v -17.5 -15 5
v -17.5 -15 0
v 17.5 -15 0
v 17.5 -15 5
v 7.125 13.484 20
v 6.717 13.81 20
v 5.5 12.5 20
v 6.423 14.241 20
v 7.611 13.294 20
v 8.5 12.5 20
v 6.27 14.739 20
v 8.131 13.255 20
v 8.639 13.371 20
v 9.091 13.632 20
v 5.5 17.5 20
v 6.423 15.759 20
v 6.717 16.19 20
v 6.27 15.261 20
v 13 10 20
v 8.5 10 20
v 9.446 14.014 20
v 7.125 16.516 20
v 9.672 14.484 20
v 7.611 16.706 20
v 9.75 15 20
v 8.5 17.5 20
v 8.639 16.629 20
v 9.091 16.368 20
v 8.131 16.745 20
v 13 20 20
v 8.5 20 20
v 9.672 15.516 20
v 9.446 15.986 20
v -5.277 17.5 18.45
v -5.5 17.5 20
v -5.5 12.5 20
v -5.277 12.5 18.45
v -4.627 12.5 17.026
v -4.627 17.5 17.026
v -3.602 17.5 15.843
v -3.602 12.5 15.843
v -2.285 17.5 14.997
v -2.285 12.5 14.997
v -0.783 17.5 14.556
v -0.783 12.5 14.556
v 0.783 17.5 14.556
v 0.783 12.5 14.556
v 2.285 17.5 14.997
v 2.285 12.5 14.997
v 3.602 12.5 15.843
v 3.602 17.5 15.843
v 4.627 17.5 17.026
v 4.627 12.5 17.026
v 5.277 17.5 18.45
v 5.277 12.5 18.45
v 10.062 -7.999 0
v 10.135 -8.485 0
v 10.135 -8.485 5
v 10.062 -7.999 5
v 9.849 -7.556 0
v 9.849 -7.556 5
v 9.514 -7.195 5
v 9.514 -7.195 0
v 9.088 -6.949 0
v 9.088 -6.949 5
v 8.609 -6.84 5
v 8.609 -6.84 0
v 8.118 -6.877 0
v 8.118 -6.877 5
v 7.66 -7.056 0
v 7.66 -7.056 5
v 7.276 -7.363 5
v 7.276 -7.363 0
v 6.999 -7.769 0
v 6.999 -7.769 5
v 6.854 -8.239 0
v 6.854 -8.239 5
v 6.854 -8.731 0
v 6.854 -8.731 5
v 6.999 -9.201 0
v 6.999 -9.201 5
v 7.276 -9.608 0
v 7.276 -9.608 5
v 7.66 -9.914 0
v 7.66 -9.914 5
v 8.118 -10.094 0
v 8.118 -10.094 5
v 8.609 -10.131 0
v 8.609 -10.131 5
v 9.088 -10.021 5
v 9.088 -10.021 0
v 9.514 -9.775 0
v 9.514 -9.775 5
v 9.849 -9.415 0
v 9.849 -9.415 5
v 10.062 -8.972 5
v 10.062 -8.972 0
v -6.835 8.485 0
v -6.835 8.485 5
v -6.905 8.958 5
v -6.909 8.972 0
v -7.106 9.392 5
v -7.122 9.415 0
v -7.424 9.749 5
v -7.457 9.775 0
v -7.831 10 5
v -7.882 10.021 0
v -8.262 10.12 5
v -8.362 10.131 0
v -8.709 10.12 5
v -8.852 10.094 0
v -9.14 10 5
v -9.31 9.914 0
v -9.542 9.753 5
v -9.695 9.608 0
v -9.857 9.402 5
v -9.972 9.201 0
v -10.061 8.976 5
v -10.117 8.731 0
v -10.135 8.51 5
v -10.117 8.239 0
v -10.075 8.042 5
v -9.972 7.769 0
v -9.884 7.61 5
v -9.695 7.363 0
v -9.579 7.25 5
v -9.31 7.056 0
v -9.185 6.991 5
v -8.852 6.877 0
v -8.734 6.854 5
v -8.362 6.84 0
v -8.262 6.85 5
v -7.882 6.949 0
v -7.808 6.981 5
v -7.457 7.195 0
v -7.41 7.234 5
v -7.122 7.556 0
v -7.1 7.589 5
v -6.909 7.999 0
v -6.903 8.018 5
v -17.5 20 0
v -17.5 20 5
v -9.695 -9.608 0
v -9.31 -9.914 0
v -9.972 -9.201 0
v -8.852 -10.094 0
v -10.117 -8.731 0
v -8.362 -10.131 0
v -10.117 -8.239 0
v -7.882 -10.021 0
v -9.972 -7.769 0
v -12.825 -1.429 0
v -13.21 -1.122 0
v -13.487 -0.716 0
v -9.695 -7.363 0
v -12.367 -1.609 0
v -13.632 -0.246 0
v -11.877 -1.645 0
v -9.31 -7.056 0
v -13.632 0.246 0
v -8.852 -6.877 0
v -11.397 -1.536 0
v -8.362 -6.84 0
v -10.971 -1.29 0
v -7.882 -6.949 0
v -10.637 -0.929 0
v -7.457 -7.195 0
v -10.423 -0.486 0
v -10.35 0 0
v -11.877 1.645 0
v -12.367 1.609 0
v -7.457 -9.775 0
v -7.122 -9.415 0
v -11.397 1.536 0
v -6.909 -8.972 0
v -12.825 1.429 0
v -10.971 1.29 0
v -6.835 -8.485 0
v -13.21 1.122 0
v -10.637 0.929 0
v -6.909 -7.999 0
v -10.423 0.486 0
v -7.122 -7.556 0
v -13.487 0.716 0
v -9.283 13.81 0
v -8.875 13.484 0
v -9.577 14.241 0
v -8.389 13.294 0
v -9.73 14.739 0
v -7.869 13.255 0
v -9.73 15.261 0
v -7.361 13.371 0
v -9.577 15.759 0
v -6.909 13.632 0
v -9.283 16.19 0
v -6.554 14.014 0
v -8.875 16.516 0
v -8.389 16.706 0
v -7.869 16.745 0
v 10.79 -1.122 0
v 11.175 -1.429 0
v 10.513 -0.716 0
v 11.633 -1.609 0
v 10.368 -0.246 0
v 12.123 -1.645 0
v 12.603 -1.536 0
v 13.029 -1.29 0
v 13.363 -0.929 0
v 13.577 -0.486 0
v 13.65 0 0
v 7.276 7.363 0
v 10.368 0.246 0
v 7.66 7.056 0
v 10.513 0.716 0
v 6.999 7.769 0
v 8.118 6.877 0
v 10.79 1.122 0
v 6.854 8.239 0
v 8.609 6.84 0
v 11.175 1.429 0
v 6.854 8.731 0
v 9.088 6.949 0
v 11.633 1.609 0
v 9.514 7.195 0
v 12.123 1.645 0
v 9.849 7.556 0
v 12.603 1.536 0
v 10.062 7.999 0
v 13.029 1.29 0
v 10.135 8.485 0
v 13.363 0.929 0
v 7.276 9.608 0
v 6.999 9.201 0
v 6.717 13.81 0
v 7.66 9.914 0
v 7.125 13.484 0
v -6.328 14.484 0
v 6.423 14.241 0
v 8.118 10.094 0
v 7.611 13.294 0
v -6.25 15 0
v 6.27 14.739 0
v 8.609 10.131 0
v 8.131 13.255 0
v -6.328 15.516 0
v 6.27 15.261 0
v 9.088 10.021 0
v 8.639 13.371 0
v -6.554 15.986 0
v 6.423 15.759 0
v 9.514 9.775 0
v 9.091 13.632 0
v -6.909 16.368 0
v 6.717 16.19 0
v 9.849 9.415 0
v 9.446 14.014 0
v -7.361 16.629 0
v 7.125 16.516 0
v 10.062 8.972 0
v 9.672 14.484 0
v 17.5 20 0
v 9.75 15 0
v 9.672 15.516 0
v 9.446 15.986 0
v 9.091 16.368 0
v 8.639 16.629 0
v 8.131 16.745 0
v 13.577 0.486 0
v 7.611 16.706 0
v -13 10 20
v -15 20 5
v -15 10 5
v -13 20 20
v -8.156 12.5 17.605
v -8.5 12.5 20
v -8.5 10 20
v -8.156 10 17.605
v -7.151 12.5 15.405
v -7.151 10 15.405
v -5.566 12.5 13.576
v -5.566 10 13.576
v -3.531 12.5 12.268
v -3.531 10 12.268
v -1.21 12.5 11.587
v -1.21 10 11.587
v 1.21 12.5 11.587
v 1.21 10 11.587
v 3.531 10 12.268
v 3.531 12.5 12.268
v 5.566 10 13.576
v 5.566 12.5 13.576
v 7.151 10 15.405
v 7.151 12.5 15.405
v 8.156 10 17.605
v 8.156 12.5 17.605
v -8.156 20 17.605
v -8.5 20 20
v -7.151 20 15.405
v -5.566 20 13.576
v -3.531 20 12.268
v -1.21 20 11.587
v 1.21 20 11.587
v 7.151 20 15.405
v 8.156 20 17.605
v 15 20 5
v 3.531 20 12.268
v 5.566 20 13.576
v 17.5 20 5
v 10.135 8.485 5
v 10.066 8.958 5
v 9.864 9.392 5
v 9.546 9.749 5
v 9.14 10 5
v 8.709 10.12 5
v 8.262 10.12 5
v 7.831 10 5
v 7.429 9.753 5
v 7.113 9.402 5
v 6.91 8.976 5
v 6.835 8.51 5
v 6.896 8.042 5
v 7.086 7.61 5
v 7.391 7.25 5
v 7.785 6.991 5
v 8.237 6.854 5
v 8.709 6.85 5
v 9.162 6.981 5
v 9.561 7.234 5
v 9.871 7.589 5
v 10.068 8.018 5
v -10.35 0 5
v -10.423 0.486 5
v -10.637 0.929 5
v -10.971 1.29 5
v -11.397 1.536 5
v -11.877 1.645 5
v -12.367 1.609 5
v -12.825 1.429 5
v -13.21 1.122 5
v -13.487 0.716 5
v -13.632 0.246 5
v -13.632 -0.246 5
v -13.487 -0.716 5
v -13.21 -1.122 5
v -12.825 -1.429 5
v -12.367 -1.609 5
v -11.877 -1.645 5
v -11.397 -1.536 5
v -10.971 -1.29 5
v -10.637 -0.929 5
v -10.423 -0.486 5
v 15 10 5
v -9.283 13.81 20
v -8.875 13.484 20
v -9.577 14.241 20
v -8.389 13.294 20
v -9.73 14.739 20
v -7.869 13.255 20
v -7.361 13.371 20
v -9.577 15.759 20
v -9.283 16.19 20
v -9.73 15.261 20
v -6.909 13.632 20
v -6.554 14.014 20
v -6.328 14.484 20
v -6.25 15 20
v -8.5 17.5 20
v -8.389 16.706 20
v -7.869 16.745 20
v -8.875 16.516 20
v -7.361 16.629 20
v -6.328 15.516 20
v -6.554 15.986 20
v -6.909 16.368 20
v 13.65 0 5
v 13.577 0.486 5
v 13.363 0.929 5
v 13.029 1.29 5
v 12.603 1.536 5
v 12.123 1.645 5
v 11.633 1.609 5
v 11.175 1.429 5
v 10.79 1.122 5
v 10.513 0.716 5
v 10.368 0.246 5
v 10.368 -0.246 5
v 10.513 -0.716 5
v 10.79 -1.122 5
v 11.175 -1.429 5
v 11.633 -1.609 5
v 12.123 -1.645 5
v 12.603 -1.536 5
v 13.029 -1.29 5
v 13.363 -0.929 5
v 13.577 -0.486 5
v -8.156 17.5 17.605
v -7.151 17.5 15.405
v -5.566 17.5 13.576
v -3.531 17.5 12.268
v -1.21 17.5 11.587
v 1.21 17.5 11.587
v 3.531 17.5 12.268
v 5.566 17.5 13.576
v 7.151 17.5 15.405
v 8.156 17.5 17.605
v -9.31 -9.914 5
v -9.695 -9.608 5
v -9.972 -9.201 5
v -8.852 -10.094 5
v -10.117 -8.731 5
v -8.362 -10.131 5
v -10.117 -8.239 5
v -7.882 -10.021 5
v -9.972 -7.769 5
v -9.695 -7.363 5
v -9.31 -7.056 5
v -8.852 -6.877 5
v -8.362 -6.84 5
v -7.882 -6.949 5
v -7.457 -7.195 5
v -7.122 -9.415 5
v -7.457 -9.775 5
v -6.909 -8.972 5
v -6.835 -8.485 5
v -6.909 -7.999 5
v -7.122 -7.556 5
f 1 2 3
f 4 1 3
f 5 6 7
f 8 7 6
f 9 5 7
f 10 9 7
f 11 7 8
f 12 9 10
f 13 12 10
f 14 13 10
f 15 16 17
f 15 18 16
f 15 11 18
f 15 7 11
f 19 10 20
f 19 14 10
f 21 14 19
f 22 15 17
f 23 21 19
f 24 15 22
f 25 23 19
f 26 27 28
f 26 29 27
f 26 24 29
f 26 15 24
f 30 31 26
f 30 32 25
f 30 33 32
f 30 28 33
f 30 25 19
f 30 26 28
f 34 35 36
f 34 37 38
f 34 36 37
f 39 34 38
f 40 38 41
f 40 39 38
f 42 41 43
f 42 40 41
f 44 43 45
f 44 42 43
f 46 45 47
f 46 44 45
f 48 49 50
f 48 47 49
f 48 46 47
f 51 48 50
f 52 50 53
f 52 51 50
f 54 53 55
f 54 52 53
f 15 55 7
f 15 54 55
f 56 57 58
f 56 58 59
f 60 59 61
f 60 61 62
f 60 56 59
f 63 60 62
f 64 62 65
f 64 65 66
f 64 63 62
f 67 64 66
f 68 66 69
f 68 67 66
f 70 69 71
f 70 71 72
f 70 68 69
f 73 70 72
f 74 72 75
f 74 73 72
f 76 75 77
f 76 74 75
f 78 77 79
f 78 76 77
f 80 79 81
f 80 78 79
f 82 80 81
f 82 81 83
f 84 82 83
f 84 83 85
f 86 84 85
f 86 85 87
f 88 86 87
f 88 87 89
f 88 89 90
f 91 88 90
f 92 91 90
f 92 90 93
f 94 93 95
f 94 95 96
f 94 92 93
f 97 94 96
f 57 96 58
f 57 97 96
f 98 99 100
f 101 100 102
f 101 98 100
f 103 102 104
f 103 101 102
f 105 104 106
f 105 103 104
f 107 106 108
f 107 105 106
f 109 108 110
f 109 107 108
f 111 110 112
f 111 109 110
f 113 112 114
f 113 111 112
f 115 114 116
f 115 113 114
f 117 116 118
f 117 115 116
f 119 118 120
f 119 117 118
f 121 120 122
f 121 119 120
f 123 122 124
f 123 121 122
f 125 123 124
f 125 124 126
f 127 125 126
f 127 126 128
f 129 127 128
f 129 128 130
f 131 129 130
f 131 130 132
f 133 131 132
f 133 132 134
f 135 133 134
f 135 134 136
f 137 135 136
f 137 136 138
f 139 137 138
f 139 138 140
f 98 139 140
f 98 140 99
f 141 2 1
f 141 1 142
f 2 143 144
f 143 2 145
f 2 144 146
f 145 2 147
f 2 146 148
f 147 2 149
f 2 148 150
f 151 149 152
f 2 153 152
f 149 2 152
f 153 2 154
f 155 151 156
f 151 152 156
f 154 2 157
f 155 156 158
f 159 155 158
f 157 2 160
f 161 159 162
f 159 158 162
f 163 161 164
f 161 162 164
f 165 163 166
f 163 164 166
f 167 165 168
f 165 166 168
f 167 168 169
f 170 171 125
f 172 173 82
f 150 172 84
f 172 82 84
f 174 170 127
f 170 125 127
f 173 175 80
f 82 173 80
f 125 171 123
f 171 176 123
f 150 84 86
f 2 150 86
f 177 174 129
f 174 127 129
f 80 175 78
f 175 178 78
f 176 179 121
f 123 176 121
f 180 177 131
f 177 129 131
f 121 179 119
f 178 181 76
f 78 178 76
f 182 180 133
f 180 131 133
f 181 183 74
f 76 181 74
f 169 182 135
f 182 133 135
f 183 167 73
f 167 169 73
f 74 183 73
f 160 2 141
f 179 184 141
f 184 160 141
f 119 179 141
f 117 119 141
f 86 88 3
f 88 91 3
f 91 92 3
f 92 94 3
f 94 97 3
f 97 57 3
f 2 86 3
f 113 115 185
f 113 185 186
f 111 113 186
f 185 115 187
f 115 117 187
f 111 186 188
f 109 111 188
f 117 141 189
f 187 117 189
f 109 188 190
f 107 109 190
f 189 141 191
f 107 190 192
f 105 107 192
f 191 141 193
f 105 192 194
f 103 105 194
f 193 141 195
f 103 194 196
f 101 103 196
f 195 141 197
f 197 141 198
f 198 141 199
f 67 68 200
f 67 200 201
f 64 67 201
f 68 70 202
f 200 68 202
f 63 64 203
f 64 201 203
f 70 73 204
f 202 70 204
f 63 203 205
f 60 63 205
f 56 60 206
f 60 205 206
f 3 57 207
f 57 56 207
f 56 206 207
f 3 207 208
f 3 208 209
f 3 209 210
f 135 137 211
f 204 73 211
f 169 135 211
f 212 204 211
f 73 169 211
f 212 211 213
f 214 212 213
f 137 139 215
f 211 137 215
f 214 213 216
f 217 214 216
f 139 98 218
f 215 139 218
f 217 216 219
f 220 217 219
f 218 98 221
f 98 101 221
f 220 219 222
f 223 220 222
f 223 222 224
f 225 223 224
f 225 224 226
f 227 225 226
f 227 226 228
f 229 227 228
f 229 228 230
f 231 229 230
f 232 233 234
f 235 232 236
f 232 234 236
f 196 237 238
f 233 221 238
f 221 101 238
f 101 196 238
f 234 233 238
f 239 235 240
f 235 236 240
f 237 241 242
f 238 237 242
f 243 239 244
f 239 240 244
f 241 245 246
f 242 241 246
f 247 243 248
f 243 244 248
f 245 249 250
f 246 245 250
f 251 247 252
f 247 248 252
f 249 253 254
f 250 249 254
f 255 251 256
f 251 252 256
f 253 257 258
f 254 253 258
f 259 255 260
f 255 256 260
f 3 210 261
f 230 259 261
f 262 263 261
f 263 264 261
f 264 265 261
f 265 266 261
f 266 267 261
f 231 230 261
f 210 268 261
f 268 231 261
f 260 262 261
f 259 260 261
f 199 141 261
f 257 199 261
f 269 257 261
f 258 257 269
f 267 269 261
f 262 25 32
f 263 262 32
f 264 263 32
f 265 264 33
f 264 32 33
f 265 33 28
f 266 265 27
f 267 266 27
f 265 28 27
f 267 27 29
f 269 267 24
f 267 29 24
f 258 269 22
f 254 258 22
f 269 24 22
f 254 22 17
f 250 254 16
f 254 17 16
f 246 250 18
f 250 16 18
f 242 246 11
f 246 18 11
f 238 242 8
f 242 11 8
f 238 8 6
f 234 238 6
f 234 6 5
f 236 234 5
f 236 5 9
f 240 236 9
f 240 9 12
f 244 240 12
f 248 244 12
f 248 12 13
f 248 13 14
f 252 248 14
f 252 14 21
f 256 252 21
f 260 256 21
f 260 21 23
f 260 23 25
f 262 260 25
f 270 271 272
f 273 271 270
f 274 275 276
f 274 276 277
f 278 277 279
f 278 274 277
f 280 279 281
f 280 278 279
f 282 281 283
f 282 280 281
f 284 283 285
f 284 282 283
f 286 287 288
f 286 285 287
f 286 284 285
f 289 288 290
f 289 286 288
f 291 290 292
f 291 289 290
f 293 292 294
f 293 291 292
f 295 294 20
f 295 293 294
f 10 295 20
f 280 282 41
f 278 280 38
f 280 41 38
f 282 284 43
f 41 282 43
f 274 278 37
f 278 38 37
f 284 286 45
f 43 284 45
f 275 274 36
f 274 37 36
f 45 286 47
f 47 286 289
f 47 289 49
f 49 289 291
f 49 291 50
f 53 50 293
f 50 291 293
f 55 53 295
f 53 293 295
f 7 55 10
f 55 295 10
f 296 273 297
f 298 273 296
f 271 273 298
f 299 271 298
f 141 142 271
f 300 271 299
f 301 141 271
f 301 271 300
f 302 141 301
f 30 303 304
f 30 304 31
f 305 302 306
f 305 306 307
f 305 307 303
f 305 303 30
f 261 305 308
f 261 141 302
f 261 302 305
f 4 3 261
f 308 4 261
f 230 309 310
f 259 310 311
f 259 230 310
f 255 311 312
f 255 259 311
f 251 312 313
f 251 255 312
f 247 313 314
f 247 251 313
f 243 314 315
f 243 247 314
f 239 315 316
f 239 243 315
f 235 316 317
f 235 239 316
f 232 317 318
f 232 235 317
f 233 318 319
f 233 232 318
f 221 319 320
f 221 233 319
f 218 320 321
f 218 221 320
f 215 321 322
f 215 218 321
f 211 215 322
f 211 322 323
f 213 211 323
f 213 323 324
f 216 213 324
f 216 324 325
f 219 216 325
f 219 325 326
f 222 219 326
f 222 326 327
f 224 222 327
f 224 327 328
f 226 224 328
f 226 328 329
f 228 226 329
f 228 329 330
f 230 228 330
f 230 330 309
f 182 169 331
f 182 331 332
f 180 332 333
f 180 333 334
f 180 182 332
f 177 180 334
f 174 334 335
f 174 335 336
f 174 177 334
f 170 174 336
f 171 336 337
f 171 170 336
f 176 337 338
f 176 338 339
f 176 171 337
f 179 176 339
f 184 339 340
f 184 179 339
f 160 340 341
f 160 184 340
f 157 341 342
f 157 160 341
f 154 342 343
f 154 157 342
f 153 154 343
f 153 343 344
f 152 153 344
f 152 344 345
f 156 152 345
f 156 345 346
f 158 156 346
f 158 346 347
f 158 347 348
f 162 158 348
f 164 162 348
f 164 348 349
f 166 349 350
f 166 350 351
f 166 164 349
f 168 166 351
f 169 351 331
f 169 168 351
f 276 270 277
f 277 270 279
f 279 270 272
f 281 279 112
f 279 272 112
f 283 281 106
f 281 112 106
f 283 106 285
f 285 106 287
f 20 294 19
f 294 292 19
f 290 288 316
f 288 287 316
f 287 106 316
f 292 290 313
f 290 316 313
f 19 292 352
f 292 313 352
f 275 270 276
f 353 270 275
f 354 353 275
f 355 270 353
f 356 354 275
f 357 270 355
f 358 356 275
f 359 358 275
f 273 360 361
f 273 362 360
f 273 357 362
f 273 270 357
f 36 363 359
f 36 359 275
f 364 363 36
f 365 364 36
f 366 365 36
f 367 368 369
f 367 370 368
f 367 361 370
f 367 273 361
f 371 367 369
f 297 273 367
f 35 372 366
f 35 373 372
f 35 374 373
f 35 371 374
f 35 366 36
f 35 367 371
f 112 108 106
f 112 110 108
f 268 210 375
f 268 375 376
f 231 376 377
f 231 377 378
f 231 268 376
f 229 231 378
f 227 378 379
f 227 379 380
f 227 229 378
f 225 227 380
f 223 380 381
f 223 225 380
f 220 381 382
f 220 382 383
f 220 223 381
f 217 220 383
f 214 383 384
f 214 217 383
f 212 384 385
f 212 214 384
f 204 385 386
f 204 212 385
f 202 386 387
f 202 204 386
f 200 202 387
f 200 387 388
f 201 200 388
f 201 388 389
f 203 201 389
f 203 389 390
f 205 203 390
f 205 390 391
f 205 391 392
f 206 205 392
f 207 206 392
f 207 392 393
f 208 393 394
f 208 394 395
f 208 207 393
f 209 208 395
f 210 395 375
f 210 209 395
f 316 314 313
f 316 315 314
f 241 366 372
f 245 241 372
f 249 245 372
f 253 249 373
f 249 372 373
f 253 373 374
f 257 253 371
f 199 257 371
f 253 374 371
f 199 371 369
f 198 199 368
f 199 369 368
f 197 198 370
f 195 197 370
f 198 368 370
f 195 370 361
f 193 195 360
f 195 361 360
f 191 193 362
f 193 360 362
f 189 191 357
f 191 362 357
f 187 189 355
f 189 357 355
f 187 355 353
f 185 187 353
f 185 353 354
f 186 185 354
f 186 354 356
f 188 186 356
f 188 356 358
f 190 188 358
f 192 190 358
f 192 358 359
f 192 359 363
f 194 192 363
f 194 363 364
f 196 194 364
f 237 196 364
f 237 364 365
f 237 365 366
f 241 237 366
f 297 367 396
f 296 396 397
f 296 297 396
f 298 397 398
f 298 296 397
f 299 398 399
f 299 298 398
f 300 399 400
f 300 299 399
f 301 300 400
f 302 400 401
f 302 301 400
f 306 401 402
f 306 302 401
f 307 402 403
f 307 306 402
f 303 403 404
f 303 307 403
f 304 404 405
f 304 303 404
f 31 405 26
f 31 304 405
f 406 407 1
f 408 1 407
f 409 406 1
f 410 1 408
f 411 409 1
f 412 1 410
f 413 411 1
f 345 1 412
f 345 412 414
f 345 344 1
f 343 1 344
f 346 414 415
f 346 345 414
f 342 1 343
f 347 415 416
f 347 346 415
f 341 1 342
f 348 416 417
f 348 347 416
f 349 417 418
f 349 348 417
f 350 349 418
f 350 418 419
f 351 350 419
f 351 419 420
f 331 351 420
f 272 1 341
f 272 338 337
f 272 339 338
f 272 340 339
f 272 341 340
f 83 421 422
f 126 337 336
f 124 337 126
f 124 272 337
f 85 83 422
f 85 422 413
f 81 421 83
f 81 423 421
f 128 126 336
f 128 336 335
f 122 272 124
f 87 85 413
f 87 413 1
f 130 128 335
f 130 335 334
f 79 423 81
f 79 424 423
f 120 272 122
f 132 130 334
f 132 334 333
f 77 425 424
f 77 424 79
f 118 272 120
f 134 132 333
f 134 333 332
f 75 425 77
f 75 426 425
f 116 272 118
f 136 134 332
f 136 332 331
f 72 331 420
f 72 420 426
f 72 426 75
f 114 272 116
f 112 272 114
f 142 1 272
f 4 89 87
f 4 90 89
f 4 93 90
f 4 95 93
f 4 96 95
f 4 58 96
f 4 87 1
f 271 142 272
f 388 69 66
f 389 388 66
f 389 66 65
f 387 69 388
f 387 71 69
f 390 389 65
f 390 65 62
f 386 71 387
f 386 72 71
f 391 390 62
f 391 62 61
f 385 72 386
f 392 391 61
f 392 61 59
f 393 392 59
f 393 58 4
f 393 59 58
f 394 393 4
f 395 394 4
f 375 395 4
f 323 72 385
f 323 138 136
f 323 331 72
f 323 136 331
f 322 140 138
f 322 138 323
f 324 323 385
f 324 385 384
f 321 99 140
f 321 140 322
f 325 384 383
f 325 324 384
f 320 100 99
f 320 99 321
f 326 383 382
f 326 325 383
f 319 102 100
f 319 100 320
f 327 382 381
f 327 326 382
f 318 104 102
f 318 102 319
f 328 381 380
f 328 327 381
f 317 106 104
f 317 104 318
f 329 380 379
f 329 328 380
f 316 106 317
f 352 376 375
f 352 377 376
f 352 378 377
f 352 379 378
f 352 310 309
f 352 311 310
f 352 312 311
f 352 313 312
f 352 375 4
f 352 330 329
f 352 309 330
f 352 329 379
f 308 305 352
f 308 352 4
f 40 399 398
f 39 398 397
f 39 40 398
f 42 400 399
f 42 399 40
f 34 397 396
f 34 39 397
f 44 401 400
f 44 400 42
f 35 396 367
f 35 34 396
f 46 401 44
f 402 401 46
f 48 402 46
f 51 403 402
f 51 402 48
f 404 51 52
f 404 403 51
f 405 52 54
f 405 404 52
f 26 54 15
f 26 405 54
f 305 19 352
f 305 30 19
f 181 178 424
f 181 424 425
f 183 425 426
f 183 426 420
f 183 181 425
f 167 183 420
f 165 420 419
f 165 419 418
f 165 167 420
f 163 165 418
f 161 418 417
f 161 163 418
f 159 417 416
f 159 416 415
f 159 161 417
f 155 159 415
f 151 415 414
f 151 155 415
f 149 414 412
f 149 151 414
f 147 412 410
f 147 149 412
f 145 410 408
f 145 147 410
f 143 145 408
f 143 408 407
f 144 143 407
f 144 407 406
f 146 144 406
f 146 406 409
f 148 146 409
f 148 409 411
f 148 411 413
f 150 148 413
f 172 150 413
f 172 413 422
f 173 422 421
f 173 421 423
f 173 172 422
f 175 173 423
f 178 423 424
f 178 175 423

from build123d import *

# Parameters (mm, degrees)
ESBO_O1_W                  = 50
ESBO_O1_H                  = 50
ESBO_O1_R                  = 1.65
RESSALTO_EXTRUS_O1_DEPTH   = 5
RESSALTO_EXTRUS_O2_START   = 15
RESSALTO_EXTRUS_O2_DEPTH   = 5
ESBO_O4_W                  = 8.5
ESBO_O4_H                  = 2.5
CORTE_EXTRUS_O1_DEPTH      = 39.405728739
CORTE_EXTRUS_O1_DEPTH_BACK = 39.405728739
ESBO_O5_W                  = 50
ESBO_O5_H                  = 50
ESBO_O5_W_2                = 35
ESBO_O5_H_2                = 35
ESBO_O6_R                  = 1.75
CORTE_EXTRUS_O2_DEPTH      = 34.260336739


with BuildPart() as part:
    # Esboço1 → Ressalto-extrusão1 (new body)
    with BuildSketch(Plane.XY):
        Rectangle(ESBO_O1_W, ESBO_O1_H)
        with Locations((12, 0)):
            Circle(ESBO_O1_R, mode=Mode.SUBTRACT)
        with Locations((8.485281374, -8.485281374)):
            Circle(ESBO_O1_R, mode=Mode.SUBTRACT)
        with Locations((-8.485281374, -8.485281374)):
            Circle(ESBO_O1_R, mode=Mode.SUBTRACT)
        with Locations((-12, 0)):
            Circle(ESBO_O1_R, mode=Mode.SUBTRACT)
        with Locations((-8.485281374, 8.485281374)):
            Circle(ESBO_O1_R, mode=Mode.SUBTRACT)
        with Locations((8.485281374, 8.485281374)):
            Circle(ESBO_O1_R, mode=Mode.SUBTRACT)
    extrude(amount=RESSALTO_EXTRUS_O1_DEPTH)

    # Esboço2 → Ressalto-extrusão2 (add, symmetric)
    with BuildSketch(Plane(origin=(0, 0, 0), x_dir=(1, 0, 0), z_dir=(0, 1, 0)).offset(RESSALTO_EXTRUS_O2_START)):
        with BuildLine():
            Line((13, -20), (15, -5))
            Line((15, -5), (-15, -5))
            Line((-15, -5), (-13, -20))
            Line((-13, -20), (-5.5, -20))
            ThreePointArc((-5.5, -20), (0, -14.5), (5.5, -20))
            Line((5.5, -20), (13, -20))
        make_face()
    extrude(amount=RESSALTO_EXTRUS_O2_DEPTH, both=True)

    # Esboço4 → Corte-Revolução3 (revolve, cut)
    with BuildSketch(Plane(origin=(0, 0, 0), x_dir=(0, 0, -1), z_dir=(1, 0, 0))):
        with Locations((-15.75, 18.75)):
            Rectangle(ESBO_O4_W, ESBO_O4_H)
        with Locations((-15.75, 11.25)):
            Rectangle(ESBO_O4_W, ESBO_O4_H)
    revolve(axis=Axis((0, 20, 20), (0, -1, 0)), mode=Mode.SUBTRACT)

    # Esboço5 → Corte-extrusão1 (cut, two sides: drawn at the far end of the back side and taken through both)
    with BuildSketch(Plane.XY.offset(5).offset(-CORTE_EXTRUS_O1_DEPTH_BACK)):
        Rectangle(ESBO_O5_W, ESBO_O5_H)
        with Locations((0, 2.5)):
            Rectangle(ESBO_O5_W_2, ESBO_O5_H_2, mode=Mode.SUBTRACT)
    extrude(amount=CORTE_EXTRUS_O1_DEPTH + CORTE_EXTRUS_O1_DEPTH_BACK, mode=Mode.SUBTRACT)

    # Esboço6 → Corte-extrusão2 (cut, through all)
    with BuildSketch(Plane.XY.offset(20)):
        with Locations((-8, 15)):
            Circle(ESBO_O6_R)
        with Locations((8, 15)):
            Circle(ESBO_O6_R)
    extrude(amount=-CORTE_EXTRUS_O2_DEPTH, mode=Mode.SUBTRACT)


solid = part.part
